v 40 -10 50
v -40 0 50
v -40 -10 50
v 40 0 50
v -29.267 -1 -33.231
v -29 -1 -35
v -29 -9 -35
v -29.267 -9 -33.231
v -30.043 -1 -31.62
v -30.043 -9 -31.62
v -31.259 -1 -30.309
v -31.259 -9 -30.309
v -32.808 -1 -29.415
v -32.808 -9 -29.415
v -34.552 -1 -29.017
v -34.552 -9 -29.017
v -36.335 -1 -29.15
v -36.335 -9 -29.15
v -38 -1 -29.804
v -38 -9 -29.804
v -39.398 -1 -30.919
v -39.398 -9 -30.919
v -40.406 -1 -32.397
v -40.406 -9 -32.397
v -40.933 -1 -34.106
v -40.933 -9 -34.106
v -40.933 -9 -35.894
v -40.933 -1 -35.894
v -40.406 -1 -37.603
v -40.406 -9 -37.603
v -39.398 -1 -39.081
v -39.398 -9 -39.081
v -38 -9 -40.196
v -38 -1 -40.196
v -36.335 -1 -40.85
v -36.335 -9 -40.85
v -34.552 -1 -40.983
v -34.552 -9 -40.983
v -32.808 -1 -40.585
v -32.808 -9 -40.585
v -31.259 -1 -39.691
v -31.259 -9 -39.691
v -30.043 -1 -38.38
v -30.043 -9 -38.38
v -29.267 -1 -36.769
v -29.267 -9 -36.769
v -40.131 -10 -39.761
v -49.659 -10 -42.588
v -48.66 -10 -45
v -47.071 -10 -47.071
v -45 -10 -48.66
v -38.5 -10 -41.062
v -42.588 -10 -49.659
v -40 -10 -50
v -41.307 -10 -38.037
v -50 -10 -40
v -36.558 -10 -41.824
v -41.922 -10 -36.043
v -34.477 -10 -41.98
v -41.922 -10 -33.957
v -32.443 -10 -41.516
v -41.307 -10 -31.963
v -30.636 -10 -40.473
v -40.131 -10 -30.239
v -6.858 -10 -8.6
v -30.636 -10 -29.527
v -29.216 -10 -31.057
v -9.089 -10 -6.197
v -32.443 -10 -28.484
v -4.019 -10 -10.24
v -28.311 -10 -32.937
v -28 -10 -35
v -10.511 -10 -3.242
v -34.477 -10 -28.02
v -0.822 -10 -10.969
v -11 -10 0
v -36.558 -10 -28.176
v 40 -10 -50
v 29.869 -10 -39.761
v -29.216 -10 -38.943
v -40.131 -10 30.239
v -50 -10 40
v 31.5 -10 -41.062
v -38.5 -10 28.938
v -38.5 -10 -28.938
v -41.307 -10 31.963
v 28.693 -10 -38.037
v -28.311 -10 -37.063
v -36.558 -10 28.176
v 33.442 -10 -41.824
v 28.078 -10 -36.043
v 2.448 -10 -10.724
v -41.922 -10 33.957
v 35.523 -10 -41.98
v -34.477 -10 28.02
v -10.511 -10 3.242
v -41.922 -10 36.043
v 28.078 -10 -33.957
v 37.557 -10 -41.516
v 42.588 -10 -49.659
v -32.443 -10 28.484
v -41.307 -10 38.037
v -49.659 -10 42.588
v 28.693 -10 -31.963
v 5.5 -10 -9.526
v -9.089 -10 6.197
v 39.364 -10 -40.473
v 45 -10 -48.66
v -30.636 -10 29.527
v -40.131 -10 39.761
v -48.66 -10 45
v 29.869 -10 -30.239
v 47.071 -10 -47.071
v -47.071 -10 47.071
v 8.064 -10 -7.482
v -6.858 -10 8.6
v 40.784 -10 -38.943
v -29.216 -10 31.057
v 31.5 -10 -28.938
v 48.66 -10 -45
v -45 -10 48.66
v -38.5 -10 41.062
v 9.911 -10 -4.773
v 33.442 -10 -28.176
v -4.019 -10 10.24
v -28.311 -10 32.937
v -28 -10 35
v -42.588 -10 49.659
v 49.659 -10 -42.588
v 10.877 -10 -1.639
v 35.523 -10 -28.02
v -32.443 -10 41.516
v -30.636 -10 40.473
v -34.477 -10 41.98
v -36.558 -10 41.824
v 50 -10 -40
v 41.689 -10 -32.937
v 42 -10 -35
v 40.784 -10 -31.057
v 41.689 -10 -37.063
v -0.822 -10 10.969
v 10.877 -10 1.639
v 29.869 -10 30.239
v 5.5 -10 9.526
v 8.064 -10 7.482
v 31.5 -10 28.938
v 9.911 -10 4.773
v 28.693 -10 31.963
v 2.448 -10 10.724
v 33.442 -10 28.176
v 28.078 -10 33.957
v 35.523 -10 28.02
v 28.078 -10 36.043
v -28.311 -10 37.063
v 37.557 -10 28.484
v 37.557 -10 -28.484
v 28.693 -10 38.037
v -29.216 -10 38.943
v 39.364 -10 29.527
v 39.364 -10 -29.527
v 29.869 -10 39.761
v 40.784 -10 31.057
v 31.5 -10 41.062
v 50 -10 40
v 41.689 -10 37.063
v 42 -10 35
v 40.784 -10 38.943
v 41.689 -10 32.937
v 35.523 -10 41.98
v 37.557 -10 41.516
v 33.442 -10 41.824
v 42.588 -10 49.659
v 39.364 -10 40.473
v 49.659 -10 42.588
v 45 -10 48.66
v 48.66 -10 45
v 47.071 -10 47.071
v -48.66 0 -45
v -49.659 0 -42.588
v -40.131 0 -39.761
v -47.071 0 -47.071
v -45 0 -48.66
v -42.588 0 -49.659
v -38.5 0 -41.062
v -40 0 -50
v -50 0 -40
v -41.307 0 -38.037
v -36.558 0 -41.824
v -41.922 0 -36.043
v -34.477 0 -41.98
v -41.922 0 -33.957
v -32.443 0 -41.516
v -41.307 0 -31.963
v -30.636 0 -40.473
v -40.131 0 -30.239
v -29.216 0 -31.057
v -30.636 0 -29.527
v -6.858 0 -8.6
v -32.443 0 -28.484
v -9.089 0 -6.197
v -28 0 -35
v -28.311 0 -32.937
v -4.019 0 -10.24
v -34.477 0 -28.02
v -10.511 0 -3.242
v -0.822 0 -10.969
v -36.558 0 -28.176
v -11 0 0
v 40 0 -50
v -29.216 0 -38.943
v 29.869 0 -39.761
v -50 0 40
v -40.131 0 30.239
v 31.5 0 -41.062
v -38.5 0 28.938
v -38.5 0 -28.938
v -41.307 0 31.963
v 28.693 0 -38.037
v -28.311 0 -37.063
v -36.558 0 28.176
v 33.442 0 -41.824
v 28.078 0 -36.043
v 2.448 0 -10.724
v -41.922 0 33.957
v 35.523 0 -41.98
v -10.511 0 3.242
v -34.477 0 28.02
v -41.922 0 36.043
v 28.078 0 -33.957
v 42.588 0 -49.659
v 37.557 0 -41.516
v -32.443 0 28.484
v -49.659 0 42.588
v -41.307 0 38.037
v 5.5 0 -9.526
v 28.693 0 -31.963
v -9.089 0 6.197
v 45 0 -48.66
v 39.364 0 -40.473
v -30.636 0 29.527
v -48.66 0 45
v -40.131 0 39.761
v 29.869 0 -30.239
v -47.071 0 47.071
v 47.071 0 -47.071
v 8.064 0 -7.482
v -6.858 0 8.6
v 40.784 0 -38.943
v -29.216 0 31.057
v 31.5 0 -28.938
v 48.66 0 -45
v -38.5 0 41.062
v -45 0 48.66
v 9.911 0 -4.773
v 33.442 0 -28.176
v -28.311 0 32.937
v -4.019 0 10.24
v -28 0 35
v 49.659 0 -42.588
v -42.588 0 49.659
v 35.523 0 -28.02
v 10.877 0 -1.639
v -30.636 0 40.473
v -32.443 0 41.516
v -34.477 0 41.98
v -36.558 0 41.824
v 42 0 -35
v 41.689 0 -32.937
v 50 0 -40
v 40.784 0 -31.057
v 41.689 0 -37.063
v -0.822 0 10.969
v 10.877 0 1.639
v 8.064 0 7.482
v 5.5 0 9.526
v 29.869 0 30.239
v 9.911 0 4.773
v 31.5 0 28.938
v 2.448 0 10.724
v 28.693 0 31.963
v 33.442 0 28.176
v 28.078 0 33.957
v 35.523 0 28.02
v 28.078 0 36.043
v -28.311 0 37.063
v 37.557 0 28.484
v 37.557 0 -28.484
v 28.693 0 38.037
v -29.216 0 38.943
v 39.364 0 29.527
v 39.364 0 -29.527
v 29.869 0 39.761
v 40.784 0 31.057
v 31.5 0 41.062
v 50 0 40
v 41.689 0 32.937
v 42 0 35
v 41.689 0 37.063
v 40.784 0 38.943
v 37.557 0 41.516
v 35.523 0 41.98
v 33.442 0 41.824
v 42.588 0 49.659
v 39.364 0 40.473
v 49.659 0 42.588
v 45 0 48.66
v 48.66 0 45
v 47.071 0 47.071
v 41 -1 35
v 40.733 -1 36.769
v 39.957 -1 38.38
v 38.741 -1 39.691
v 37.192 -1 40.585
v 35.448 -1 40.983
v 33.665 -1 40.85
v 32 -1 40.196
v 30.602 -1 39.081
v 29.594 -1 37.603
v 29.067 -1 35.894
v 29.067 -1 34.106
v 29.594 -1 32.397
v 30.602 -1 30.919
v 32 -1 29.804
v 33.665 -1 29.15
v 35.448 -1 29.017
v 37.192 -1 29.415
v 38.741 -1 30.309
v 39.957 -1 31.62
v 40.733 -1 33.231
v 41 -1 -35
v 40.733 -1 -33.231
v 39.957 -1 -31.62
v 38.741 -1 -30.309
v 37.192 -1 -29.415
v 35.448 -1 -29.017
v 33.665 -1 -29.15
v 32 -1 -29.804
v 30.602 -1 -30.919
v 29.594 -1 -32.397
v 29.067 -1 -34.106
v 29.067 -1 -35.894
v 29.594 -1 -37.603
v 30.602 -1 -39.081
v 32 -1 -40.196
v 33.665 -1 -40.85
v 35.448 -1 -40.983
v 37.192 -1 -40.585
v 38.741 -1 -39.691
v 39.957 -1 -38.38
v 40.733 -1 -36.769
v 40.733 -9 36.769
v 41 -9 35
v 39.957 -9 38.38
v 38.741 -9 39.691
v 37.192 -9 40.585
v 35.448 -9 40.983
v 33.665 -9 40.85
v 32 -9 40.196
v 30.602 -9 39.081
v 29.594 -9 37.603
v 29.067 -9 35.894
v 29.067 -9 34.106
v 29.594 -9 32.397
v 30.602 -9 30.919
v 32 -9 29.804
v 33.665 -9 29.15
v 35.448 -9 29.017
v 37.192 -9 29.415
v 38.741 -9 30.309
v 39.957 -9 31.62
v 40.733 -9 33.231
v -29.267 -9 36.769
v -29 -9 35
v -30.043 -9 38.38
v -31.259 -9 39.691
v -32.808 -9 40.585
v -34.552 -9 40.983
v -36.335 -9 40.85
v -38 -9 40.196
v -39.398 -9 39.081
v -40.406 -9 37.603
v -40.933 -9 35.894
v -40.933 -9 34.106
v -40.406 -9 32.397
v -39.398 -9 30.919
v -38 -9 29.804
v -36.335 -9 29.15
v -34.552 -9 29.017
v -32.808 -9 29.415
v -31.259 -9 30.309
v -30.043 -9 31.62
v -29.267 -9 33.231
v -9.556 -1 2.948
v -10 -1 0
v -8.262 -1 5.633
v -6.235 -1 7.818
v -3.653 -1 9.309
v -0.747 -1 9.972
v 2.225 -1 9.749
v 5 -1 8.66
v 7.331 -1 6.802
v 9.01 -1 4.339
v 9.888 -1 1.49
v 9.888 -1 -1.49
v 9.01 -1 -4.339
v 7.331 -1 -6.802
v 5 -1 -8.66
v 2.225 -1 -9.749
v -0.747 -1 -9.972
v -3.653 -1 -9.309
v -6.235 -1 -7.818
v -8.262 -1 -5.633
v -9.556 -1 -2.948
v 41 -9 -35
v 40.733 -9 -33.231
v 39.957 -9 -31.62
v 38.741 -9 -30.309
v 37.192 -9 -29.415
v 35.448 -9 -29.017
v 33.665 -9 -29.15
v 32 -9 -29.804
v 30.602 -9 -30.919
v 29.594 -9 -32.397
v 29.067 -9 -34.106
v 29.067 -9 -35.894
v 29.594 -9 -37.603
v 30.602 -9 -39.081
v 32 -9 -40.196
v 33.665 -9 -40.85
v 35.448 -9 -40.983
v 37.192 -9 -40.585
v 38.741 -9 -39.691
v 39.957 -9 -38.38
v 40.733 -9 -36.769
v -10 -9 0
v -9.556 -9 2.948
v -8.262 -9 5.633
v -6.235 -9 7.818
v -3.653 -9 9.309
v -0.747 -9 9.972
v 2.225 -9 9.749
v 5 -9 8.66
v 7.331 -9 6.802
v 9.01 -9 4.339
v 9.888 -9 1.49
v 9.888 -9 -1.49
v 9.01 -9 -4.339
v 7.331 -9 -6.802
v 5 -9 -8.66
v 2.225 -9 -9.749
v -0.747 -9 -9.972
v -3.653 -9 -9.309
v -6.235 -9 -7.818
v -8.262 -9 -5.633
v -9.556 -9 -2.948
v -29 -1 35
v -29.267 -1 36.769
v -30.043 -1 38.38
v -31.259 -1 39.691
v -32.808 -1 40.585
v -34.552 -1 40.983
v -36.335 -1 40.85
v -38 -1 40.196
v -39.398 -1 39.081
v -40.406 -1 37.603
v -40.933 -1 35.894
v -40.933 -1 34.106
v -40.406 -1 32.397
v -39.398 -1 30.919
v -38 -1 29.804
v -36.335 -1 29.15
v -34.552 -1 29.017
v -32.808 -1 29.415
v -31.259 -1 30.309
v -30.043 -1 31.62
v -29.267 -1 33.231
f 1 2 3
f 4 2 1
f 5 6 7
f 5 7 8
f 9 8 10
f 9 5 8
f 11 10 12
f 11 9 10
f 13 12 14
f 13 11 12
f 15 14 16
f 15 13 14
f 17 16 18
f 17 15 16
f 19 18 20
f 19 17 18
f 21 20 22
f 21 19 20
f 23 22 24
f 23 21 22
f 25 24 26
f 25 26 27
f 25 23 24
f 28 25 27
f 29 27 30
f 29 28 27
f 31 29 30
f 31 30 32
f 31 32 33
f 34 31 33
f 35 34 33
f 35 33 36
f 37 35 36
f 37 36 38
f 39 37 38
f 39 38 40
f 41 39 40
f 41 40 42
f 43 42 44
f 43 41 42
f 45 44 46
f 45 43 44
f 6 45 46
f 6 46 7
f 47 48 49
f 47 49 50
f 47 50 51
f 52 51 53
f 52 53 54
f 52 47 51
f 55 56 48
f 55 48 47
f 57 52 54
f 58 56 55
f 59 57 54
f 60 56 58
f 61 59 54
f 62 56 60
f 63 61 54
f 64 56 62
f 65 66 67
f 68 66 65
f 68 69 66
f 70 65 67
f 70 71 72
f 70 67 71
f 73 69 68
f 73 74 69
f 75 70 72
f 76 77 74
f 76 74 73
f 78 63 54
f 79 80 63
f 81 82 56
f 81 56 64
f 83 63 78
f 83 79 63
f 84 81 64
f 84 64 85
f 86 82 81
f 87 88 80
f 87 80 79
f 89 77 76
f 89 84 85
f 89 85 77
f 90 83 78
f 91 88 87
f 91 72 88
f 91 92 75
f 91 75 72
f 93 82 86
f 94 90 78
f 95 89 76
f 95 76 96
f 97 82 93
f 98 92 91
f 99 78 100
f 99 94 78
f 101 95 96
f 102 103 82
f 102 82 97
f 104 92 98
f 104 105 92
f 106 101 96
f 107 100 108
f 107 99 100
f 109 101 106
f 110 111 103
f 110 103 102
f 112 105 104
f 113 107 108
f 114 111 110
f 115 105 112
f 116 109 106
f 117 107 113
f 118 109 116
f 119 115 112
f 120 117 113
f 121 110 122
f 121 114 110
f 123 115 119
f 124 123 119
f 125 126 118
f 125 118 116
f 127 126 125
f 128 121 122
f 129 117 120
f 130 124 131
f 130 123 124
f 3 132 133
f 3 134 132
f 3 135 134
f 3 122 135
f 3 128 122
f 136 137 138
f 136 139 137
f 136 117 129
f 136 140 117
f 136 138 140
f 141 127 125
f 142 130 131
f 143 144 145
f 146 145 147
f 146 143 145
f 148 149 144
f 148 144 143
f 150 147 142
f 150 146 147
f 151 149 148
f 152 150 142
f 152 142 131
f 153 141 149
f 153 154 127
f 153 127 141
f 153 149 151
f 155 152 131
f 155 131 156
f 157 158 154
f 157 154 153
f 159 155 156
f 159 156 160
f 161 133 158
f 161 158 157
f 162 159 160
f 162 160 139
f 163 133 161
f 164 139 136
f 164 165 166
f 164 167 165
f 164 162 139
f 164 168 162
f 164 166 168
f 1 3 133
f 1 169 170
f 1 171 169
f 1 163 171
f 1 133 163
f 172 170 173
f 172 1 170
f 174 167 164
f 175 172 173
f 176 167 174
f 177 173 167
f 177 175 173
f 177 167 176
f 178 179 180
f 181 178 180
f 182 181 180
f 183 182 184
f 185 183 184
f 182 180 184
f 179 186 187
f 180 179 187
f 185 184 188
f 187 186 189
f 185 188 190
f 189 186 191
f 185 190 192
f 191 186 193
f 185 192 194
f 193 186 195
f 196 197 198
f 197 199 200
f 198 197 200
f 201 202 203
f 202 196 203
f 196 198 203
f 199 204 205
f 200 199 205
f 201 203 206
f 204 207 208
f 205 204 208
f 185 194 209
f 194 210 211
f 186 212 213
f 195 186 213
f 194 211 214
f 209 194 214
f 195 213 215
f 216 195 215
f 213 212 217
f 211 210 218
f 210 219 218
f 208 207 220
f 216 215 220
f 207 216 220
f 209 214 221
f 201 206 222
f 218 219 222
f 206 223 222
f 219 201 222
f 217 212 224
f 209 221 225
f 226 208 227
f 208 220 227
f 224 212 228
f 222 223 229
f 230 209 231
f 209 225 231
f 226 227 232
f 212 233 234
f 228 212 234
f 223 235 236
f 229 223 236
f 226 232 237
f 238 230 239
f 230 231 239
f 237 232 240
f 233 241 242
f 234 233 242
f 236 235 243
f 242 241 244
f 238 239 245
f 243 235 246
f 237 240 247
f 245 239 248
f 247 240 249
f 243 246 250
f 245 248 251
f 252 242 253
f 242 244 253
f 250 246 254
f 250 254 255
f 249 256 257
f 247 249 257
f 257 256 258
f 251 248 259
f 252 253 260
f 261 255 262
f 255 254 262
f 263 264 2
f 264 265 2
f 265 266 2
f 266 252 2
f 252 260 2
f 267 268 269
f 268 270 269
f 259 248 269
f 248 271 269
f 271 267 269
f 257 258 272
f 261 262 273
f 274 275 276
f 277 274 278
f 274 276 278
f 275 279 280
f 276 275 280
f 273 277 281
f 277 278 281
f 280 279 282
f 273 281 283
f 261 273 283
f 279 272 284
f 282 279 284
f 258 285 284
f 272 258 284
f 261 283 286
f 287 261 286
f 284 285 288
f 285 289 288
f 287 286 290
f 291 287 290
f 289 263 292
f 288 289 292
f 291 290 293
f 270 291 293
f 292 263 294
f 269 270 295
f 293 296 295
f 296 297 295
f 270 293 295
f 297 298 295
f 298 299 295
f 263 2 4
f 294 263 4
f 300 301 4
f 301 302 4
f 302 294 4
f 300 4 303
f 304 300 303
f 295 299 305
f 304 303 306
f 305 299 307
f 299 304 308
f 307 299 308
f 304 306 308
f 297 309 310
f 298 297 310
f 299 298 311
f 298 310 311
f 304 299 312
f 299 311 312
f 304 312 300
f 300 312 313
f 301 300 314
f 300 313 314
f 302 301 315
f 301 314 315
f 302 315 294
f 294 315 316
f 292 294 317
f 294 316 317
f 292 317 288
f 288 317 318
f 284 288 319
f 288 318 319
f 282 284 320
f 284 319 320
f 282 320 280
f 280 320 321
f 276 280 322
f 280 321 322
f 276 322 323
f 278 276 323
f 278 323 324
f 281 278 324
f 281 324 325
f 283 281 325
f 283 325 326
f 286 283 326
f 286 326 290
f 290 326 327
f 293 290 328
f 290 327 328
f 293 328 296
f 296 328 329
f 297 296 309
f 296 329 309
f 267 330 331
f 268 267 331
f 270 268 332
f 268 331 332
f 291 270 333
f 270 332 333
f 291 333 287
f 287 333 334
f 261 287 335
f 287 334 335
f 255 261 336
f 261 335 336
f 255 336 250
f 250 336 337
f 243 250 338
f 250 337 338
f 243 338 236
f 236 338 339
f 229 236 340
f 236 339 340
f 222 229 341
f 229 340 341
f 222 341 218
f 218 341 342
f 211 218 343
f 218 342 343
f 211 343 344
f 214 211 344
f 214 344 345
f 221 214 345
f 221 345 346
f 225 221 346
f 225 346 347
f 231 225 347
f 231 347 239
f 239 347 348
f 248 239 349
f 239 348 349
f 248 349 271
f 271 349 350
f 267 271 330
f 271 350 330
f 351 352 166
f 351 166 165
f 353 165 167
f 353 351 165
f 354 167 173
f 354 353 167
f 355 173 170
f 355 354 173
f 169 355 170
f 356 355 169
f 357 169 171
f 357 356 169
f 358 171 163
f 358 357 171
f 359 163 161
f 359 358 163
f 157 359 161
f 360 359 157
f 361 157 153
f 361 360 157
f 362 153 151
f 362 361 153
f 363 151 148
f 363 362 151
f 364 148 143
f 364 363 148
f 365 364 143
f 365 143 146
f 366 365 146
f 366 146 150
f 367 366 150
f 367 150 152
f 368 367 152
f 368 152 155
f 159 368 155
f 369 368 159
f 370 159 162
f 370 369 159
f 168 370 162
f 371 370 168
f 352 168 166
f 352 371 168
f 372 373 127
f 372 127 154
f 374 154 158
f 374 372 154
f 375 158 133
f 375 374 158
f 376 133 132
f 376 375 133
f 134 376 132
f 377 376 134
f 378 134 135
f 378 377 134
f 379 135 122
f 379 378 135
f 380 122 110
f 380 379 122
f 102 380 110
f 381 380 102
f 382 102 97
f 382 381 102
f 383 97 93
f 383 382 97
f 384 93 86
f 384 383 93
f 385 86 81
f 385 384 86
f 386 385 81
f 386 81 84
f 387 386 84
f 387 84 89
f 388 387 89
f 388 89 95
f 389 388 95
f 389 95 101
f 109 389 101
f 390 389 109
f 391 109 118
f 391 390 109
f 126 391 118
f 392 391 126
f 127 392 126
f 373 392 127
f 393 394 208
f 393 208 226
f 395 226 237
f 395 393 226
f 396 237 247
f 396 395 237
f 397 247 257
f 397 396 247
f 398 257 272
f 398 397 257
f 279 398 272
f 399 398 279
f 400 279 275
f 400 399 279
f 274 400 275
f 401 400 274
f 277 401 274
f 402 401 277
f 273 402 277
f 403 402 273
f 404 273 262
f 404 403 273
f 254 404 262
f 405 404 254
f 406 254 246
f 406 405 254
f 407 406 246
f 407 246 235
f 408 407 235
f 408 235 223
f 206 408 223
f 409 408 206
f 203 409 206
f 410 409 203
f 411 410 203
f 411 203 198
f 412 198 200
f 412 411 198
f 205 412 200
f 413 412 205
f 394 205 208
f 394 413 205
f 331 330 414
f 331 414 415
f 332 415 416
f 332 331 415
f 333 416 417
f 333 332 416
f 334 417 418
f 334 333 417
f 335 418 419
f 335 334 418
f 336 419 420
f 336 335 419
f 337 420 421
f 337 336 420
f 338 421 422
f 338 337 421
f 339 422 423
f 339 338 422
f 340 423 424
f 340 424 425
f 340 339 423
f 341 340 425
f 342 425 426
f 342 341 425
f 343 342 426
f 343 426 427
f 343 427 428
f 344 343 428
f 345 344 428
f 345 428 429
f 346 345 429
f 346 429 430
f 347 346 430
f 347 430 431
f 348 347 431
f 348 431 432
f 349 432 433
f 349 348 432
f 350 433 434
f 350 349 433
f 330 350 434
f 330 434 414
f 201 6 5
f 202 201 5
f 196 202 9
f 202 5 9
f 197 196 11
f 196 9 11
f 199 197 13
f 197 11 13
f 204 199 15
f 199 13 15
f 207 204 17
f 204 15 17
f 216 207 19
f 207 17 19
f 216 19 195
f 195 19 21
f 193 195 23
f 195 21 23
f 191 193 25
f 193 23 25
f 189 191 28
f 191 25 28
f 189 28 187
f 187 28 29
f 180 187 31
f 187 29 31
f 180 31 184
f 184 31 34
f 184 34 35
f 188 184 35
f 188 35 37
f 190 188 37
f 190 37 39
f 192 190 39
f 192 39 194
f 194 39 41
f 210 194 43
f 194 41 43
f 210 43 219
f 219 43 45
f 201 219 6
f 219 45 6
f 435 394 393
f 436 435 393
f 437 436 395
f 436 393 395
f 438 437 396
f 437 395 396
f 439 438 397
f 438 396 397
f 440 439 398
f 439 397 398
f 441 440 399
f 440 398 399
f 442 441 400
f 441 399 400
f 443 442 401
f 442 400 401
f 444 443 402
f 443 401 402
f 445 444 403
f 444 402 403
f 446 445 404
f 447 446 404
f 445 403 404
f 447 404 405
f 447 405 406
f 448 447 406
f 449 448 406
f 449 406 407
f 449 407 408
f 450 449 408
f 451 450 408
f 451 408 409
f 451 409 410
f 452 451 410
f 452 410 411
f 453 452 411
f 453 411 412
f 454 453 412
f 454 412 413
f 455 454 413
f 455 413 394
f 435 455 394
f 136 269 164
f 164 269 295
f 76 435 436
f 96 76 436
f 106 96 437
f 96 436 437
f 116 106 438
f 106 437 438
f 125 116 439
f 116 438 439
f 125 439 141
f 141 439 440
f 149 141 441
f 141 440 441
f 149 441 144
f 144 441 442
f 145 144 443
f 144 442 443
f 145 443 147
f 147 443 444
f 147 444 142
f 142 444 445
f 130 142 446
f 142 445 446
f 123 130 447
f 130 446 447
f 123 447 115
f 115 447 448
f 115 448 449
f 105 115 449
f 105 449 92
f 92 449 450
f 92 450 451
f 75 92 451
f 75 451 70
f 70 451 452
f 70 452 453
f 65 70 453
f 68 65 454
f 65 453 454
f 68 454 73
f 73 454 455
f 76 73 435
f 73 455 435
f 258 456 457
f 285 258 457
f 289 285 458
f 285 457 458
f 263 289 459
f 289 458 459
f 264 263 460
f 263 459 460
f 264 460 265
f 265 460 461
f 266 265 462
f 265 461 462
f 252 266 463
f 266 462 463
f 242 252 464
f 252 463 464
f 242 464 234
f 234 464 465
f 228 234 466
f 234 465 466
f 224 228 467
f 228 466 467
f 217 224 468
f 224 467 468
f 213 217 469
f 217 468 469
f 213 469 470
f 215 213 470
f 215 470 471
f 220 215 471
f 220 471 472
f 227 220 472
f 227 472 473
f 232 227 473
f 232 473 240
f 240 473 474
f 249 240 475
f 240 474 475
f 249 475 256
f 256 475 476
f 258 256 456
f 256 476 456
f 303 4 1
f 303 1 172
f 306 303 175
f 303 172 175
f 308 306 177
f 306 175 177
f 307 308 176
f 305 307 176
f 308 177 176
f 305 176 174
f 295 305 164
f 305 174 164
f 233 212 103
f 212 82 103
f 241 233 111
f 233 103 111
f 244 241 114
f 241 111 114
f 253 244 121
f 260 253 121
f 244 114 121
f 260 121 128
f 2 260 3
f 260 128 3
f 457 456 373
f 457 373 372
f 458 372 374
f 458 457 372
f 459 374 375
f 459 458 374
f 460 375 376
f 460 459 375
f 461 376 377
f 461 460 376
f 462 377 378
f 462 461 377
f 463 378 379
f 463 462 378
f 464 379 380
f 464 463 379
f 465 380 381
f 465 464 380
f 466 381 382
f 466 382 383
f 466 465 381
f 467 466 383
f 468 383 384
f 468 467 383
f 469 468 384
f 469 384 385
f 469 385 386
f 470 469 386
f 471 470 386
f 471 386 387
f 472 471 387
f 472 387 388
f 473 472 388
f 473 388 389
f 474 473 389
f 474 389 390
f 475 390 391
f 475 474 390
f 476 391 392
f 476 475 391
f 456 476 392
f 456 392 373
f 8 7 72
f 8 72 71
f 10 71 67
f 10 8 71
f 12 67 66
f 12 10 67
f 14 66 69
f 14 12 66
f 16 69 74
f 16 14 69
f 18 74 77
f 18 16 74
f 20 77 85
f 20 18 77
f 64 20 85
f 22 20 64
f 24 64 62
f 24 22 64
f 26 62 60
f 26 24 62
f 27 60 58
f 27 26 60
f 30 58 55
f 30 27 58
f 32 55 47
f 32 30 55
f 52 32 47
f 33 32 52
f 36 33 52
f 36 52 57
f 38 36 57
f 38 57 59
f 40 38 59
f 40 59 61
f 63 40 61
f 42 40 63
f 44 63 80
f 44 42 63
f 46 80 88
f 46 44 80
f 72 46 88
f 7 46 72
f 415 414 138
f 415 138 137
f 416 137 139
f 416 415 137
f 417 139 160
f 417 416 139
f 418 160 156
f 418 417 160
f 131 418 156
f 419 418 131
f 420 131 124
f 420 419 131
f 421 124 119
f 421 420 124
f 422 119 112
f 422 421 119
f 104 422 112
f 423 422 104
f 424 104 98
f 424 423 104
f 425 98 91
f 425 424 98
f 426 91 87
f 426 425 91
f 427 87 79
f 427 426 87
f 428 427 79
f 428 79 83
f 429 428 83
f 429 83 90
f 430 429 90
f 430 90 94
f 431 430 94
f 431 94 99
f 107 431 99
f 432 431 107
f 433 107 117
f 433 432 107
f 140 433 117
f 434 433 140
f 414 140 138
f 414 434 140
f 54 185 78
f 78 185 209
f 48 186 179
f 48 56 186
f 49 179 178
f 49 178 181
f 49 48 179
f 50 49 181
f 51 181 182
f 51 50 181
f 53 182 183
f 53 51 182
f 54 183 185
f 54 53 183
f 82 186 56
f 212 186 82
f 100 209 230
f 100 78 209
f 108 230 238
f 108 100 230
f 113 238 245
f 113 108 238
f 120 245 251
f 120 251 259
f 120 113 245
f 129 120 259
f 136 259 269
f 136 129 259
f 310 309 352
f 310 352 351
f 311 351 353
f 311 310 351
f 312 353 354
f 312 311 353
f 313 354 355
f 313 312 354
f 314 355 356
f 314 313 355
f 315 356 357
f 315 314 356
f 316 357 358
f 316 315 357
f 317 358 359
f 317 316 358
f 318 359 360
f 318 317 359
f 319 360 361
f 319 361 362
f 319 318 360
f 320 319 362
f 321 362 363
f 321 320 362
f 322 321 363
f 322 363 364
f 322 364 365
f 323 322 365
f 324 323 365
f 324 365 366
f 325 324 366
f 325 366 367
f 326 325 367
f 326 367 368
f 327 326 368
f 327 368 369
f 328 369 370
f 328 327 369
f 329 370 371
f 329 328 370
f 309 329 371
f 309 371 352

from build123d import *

# Parameters (mm, degrees)
F0_W     = 100
F0_H     = 100
F0_R     = 6
F1_DEPTH = 10
F3_D     = 20
F4_R     = 10
F5_SIZE  = 1


with BuildPart() as f1:
    # F0 (on Front) → F1 (new body)
    with BuildSketch(Plane.XZ):
        Rectangle(F0_W, F0_H)
        with Locations((-35, -35)):
            Circle(F0_R, mode=Mode.SUBTRACT)
        with Locations((35, -35)):
            Circle(F0_R, mode=Mode.SUBTRACT)
        with Locations((-35, 35)):
            Circle(F0_R, mode=Mode.SUBTRACT)
        with Locations((35, 35)):
            Circle(F0_R, mode=Mode.SUBTRACT)
    extrude(amount=F1_DEPTH)

    # F3 (through all)
    with Locations(Plane.XZ.offset(10)):
        with Locations((0, 0)):
            Hole(F3_D / 2)

    # F4
    f4_edges = [f1.edges().sort_by_distance(p)[0] for p in [
        (-50, -5, -50),
        (50, -5, -50),
        (50, -5, 50),
        (-50, -5, 50),
    ]]
    fillet(f4_edges, radius=F4_R)

    # F5
    f5_edges = [f1.edges().sort_by_distance(p)[0] for p in [
        (-41, -10, 35),
        (29, -10, 35),
        (29, -10, -35),
        (-41, -10, -35),
        (-41, 0, 35),
        (-41, 0, -35),
        (29, 0, -35),
        (29, 0, 35),
        (-10, 0, 0),
        (-10, -10, 0),
    ]]
    chamfer(f5_edges, length=F5_SIZE)


solid = f1.part
